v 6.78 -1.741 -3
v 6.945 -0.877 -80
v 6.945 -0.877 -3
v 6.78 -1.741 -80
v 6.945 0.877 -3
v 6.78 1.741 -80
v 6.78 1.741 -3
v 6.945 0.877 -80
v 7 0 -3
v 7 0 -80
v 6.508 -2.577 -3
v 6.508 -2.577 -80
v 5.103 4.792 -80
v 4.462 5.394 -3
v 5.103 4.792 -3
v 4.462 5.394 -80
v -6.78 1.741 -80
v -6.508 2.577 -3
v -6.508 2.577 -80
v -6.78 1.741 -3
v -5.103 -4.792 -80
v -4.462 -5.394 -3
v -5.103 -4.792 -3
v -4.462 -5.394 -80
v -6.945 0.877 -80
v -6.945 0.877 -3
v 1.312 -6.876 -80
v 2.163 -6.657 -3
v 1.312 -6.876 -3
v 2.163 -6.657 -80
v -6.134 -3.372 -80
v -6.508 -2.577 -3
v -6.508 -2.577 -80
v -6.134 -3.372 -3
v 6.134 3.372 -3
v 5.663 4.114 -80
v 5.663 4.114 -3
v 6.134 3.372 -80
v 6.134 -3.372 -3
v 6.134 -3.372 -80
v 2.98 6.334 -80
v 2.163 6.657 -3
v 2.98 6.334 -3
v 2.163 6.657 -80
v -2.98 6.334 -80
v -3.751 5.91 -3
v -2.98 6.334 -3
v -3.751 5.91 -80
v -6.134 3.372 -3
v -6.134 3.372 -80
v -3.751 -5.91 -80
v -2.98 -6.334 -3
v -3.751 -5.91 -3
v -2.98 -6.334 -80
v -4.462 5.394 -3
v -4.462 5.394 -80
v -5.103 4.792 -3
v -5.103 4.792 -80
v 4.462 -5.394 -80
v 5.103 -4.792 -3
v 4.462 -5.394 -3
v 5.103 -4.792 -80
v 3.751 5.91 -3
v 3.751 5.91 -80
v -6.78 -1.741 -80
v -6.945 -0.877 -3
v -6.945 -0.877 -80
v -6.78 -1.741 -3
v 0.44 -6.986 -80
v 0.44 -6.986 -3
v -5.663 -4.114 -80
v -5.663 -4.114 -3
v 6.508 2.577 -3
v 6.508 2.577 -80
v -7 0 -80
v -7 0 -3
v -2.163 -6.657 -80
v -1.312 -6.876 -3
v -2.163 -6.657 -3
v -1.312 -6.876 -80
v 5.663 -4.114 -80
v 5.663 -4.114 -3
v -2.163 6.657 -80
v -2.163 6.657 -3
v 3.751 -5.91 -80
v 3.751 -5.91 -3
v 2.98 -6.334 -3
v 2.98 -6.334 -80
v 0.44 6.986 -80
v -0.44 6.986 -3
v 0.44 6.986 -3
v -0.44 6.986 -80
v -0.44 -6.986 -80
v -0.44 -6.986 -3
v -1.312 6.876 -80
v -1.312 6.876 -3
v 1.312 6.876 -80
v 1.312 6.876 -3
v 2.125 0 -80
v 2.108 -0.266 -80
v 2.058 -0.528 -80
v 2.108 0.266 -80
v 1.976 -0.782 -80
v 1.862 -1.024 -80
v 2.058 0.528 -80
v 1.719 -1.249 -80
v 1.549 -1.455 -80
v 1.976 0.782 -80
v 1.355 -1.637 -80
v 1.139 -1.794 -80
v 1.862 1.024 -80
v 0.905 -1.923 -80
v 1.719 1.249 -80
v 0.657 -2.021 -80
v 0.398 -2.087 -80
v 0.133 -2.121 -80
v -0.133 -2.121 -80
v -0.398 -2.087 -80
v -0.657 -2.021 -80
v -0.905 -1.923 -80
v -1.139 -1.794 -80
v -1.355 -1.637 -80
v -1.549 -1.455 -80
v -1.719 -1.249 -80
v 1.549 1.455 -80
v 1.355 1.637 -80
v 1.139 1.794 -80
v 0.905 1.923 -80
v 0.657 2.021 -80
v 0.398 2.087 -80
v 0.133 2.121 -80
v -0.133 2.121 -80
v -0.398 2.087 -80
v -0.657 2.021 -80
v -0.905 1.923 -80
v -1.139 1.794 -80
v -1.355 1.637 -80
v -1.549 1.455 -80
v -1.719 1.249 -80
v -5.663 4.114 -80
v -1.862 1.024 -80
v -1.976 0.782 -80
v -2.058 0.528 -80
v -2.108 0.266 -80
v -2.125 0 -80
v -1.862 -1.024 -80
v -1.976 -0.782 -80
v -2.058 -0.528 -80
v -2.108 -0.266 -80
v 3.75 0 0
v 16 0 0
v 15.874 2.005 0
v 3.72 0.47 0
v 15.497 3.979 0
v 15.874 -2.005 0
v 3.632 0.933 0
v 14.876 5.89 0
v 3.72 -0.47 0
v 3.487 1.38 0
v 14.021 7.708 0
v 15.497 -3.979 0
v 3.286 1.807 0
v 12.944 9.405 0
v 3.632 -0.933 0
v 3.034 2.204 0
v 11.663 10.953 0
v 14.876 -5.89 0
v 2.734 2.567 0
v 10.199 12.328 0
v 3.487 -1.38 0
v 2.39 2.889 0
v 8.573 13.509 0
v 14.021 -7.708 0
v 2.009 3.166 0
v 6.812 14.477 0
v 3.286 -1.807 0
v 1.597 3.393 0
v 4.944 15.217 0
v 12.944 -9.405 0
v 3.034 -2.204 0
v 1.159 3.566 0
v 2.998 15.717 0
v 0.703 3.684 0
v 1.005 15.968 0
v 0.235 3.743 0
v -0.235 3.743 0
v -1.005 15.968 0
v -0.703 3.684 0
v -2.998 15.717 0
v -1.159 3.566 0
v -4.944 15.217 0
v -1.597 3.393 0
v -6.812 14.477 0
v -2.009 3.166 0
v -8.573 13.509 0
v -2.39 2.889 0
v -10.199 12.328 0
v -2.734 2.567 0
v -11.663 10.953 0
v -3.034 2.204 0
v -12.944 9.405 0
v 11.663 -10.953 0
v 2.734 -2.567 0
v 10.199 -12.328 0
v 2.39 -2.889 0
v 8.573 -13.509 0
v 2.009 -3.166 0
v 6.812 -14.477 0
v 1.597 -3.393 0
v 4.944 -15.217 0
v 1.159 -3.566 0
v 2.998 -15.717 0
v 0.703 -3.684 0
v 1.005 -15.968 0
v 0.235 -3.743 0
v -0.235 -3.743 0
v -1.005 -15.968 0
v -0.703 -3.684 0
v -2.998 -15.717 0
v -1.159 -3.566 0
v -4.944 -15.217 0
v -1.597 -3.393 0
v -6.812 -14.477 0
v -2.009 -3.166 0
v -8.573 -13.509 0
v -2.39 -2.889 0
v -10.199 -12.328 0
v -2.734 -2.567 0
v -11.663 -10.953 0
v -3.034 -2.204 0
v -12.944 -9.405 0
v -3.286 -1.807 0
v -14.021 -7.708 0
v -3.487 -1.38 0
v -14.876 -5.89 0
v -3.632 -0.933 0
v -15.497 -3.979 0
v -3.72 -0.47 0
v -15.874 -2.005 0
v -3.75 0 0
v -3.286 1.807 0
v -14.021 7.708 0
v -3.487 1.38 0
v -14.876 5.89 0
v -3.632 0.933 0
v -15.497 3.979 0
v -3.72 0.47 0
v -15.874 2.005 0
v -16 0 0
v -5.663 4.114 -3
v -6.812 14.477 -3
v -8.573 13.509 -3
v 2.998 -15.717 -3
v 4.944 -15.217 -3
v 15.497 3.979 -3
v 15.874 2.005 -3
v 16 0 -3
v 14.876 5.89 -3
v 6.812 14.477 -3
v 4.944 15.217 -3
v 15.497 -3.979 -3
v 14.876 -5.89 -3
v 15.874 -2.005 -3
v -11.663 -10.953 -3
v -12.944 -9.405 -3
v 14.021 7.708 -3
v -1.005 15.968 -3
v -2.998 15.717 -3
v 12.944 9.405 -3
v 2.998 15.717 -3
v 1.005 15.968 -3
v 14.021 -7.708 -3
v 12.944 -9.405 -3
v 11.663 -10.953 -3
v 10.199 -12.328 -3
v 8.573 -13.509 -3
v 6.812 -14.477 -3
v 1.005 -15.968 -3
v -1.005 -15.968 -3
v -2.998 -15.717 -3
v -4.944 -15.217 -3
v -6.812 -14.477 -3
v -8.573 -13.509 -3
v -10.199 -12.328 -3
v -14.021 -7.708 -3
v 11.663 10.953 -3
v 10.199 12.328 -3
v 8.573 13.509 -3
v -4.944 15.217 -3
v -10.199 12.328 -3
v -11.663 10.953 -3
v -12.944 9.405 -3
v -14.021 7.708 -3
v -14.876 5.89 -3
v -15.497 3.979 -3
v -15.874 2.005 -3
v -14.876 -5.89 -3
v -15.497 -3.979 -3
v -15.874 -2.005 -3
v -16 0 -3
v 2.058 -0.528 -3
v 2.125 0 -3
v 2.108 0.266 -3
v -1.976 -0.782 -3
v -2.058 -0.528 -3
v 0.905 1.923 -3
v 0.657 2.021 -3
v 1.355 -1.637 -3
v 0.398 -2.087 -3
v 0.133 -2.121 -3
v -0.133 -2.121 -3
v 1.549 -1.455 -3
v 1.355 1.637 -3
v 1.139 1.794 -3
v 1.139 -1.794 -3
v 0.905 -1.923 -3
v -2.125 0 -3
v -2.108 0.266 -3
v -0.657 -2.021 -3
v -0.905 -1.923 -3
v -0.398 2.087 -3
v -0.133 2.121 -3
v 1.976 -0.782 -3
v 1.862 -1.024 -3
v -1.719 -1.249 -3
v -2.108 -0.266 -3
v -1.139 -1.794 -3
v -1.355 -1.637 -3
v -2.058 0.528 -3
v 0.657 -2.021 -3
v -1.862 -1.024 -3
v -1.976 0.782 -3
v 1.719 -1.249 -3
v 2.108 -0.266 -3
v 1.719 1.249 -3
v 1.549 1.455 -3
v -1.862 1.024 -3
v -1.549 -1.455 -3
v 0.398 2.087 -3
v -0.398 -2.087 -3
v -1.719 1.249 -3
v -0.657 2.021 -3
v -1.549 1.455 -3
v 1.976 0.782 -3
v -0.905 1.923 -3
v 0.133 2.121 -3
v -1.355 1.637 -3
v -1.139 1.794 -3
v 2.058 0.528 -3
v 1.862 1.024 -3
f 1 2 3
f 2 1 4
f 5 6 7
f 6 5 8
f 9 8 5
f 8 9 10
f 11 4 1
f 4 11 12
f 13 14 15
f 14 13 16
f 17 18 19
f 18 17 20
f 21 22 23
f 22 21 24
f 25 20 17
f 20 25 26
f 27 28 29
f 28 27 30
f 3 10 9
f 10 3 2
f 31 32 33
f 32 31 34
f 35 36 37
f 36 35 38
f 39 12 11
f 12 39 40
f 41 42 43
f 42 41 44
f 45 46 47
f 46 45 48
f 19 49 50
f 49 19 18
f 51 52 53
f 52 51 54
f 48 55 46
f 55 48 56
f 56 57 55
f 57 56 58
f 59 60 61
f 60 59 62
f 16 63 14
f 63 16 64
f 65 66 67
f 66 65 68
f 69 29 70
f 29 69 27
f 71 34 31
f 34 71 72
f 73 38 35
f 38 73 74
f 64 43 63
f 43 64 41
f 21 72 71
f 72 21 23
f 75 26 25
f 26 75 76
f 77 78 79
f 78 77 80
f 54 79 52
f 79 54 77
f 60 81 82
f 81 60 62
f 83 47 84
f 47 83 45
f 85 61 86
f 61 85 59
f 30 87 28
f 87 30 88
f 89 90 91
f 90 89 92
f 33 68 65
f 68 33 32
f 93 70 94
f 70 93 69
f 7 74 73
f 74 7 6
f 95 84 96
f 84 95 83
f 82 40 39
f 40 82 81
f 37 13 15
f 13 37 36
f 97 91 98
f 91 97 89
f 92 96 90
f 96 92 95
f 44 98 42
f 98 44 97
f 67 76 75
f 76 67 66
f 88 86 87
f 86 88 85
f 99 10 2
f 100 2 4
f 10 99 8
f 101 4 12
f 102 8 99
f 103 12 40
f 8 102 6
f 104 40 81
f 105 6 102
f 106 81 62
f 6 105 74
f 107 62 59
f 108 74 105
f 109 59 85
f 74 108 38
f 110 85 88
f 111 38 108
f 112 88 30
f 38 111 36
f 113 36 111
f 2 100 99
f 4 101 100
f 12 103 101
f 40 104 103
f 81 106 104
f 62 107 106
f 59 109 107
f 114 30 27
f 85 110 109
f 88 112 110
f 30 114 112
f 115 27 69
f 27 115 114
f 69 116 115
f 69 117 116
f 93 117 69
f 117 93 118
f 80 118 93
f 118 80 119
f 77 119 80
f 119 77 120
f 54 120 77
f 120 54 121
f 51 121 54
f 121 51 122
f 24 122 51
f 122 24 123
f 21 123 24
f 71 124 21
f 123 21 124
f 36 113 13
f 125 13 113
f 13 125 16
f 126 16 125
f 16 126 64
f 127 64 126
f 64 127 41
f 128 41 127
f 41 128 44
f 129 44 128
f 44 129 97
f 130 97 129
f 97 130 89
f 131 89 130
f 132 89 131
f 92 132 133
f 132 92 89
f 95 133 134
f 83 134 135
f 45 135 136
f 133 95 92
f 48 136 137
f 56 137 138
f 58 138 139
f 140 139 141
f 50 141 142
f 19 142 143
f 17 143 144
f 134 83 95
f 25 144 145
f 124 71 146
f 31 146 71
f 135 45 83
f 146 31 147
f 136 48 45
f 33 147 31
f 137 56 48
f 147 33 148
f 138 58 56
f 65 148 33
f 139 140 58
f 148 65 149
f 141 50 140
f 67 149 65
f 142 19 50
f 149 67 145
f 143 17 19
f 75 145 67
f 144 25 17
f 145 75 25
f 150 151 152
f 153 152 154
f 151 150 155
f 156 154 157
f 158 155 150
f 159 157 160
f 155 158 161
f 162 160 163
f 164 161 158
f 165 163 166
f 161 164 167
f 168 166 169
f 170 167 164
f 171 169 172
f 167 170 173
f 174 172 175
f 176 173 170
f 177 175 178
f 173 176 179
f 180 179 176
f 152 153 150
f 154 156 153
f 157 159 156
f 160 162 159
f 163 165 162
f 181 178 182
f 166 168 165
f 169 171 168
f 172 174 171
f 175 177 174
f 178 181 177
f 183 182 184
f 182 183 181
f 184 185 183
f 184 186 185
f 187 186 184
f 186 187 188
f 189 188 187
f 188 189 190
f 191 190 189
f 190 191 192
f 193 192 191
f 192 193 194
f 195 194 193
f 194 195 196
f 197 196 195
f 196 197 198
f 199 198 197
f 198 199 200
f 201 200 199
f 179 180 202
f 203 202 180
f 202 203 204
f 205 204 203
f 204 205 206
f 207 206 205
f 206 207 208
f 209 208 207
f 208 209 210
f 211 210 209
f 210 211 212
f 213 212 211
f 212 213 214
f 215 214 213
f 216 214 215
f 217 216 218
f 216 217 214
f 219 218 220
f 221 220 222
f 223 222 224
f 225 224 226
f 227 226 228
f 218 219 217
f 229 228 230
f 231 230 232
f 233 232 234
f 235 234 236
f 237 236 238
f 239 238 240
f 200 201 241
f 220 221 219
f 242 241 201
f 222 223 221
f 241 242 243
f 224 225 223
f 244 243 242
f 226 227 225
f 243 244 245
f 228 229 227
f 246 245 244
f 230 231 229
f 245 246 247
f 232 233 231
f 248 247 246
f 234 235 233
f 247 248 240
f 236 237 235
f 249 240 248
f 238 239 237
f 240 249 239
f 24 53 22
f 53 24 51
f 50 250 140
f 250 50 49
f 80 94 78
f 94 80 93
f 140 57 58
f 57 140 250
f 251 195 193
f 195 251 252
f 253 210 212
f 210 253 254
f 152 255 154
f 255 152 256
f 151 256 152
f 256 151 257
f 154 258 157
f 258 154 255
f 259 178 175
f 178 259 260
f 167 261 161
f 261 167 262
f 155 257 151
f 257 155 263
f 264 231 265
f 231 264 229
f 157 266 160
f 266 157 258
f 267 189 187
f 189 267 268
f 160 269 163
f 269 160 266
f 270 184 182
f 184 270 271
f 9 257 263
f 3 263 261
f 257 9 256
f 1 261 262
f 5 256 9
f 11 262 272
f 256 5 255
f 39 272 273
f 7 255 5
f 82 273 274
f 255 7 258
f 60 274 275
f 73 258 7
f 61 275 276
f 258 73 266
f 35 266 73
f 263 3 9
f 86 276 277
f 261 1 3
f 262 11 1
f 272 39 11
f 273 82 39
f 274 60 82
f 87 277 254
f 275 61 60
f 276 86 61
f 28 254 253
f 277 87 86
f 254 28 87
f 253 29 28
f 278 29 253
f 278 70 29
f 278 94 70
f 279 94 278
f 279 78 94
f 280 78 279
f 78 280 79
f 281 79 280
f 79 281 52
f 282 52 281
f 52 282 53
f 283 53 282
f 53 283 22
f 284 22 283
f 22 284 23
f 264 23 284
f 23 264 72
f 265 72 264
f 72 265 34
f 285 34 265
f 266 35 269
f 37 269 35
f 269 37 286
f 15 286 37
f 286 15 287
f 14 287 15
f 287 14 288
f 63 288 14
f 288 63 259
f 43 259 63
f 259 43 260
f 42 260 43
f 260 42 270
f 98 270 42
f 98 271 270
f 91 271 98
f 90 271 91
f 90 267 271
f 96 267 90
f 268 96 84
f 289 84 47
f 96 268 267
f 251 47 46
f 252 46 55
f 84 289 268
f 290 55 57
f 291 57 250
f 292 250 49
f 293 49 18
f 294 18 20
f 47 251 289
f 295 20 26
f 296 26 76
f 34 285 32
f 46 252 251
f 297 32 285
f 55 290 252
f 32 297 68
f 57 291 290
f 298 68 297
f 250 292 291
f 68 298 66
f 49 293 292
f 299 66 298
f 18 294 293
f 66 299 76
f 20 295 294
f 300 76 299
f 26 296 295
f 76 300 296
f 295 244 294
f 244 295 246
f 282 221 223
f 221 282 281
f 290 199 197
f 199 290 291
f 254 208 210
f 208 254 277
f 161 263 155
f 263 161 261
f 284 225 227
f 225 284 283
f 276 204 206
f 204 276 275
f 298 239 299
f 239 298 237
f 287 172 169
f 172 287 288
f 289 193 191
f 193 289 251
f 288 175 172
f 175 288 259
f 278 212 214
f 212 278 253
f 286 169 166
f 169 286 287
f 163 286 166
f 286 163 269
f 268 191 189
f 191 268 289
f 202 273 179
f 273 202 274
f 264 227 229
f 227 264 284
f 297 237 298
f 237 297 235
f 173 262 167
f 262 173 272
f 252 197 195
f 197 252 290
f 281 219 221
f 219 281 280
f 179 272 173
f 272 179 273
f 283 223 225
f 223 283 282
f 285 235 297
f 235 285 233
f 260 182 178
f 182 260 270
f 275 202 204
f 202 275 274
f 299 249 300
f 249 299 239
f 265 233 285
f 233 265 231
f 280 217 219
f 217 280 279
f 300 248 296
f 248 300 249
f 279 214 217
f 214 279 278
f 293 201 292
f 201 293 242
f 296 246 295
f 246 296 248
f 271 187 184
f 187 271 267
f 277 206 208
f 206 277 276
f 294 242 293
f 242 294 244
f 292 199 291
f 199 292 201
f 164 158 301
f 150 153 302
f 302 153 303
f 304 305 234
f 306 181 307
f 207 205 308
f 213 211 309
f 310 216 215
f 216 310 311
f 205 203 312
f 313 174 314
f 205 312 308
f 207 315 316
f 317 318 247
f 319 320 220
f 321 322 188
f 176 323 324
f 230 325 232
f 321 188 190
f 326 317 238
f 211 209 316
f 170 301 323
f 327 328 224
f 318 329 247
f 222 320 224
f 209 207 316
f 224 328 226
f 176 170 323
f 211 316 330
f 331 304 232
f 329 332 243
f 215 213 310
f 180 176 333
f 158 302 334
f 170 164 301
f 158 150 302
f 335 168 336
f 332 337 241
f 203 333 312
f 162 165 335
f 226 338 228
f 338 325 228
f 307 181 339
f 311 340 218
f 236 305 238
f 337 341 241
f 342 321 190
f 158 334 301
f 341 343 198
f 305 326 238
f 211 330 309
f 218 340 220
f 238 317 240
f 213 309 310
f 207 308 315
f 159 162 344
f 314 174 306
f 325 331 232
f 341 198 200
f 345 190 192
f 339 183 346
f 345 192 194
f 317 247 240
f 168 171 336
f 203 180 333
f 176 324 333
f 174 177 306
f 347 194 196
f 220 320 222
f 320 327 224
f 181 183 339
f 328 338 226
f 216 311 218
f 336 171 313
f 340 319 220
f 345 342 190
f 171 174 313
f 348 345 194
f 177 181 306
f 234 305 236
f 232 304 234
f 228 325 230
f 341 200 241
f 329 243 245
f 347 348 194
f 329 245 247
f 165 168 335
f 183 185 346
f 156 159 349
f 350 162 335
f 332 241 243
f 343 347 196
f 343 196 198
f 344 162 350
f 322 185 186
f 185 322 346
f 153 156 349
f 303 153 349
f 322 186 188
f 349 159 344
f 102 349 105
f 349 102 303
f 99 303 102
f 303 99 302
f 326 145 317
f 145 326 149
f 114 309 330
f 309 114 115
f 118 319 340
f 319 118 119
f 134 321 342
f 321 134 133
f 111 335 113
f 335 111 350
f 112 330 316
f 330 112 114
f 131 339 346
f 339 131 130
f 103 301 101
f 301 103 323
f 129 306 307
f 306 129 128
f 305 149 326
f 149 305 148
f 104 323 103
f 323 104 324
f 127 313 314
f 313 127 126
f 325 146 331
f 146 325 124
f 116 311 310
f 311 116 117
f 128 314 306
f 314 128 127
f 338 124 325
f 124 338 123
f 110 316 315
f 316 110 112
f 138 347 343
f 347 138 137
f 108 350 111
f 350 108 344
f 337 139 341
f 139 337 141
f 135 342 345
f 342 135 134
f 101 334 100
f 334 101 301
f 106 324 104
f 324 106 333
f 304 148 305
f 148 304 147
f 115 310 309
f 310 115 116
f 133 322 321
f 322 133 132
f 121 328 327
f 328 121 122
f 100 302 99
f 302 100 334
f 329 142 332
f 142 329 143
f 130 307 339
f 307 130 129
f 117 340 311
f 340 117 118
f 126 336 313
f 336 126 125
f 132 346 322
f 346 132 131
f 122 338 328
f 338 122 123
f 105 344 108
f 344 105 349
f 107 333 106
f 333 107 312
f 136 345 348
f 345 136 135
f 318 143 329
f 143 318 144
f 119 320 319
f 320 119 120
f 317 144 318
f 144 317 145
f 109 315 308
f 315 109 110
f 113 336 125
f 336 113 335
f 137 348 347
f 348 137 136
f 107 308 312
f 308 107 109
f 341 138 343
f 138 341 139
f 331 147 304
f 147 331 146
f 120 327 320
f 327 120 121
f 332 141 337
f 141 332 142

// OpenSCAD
$fn = 50;


difference() {
	union() {
		translate(v = [0, 0, -80.0000000000]) {
			cylinder(h = 80, r = 7.0000000000);
		}
		translate(v = [0, 0, -3.0000000000]) {
			cylinder(h = 3, r = 16.0000000000);
		}
	}
	union() {
		translate(v = [0, 0, 0]) {
			rotate(a = [0, 0, 0]) {
				difference() {
					union() {
						#translate(v = [0, 0, -80.0000000000]) {
							cylinder(h = 80, r = 2.0000000000);
						}
						#translate(v = [0, 0, -3]) {
							cylinder(h = 3, r1 = 2.1250000000, r2 = 3.7500000000);
						}
						#translate(v = [0, 0, -80.0000000000]) {
							cylinder(h = 80, r = 2.1250000000);
						}
						#translate(v = [0, 0, -80.0000000000]) {
							cylinder(h = 80, r = 2.0000000000);
						}
					}
					union();
				}
			}
		}
	}
}
